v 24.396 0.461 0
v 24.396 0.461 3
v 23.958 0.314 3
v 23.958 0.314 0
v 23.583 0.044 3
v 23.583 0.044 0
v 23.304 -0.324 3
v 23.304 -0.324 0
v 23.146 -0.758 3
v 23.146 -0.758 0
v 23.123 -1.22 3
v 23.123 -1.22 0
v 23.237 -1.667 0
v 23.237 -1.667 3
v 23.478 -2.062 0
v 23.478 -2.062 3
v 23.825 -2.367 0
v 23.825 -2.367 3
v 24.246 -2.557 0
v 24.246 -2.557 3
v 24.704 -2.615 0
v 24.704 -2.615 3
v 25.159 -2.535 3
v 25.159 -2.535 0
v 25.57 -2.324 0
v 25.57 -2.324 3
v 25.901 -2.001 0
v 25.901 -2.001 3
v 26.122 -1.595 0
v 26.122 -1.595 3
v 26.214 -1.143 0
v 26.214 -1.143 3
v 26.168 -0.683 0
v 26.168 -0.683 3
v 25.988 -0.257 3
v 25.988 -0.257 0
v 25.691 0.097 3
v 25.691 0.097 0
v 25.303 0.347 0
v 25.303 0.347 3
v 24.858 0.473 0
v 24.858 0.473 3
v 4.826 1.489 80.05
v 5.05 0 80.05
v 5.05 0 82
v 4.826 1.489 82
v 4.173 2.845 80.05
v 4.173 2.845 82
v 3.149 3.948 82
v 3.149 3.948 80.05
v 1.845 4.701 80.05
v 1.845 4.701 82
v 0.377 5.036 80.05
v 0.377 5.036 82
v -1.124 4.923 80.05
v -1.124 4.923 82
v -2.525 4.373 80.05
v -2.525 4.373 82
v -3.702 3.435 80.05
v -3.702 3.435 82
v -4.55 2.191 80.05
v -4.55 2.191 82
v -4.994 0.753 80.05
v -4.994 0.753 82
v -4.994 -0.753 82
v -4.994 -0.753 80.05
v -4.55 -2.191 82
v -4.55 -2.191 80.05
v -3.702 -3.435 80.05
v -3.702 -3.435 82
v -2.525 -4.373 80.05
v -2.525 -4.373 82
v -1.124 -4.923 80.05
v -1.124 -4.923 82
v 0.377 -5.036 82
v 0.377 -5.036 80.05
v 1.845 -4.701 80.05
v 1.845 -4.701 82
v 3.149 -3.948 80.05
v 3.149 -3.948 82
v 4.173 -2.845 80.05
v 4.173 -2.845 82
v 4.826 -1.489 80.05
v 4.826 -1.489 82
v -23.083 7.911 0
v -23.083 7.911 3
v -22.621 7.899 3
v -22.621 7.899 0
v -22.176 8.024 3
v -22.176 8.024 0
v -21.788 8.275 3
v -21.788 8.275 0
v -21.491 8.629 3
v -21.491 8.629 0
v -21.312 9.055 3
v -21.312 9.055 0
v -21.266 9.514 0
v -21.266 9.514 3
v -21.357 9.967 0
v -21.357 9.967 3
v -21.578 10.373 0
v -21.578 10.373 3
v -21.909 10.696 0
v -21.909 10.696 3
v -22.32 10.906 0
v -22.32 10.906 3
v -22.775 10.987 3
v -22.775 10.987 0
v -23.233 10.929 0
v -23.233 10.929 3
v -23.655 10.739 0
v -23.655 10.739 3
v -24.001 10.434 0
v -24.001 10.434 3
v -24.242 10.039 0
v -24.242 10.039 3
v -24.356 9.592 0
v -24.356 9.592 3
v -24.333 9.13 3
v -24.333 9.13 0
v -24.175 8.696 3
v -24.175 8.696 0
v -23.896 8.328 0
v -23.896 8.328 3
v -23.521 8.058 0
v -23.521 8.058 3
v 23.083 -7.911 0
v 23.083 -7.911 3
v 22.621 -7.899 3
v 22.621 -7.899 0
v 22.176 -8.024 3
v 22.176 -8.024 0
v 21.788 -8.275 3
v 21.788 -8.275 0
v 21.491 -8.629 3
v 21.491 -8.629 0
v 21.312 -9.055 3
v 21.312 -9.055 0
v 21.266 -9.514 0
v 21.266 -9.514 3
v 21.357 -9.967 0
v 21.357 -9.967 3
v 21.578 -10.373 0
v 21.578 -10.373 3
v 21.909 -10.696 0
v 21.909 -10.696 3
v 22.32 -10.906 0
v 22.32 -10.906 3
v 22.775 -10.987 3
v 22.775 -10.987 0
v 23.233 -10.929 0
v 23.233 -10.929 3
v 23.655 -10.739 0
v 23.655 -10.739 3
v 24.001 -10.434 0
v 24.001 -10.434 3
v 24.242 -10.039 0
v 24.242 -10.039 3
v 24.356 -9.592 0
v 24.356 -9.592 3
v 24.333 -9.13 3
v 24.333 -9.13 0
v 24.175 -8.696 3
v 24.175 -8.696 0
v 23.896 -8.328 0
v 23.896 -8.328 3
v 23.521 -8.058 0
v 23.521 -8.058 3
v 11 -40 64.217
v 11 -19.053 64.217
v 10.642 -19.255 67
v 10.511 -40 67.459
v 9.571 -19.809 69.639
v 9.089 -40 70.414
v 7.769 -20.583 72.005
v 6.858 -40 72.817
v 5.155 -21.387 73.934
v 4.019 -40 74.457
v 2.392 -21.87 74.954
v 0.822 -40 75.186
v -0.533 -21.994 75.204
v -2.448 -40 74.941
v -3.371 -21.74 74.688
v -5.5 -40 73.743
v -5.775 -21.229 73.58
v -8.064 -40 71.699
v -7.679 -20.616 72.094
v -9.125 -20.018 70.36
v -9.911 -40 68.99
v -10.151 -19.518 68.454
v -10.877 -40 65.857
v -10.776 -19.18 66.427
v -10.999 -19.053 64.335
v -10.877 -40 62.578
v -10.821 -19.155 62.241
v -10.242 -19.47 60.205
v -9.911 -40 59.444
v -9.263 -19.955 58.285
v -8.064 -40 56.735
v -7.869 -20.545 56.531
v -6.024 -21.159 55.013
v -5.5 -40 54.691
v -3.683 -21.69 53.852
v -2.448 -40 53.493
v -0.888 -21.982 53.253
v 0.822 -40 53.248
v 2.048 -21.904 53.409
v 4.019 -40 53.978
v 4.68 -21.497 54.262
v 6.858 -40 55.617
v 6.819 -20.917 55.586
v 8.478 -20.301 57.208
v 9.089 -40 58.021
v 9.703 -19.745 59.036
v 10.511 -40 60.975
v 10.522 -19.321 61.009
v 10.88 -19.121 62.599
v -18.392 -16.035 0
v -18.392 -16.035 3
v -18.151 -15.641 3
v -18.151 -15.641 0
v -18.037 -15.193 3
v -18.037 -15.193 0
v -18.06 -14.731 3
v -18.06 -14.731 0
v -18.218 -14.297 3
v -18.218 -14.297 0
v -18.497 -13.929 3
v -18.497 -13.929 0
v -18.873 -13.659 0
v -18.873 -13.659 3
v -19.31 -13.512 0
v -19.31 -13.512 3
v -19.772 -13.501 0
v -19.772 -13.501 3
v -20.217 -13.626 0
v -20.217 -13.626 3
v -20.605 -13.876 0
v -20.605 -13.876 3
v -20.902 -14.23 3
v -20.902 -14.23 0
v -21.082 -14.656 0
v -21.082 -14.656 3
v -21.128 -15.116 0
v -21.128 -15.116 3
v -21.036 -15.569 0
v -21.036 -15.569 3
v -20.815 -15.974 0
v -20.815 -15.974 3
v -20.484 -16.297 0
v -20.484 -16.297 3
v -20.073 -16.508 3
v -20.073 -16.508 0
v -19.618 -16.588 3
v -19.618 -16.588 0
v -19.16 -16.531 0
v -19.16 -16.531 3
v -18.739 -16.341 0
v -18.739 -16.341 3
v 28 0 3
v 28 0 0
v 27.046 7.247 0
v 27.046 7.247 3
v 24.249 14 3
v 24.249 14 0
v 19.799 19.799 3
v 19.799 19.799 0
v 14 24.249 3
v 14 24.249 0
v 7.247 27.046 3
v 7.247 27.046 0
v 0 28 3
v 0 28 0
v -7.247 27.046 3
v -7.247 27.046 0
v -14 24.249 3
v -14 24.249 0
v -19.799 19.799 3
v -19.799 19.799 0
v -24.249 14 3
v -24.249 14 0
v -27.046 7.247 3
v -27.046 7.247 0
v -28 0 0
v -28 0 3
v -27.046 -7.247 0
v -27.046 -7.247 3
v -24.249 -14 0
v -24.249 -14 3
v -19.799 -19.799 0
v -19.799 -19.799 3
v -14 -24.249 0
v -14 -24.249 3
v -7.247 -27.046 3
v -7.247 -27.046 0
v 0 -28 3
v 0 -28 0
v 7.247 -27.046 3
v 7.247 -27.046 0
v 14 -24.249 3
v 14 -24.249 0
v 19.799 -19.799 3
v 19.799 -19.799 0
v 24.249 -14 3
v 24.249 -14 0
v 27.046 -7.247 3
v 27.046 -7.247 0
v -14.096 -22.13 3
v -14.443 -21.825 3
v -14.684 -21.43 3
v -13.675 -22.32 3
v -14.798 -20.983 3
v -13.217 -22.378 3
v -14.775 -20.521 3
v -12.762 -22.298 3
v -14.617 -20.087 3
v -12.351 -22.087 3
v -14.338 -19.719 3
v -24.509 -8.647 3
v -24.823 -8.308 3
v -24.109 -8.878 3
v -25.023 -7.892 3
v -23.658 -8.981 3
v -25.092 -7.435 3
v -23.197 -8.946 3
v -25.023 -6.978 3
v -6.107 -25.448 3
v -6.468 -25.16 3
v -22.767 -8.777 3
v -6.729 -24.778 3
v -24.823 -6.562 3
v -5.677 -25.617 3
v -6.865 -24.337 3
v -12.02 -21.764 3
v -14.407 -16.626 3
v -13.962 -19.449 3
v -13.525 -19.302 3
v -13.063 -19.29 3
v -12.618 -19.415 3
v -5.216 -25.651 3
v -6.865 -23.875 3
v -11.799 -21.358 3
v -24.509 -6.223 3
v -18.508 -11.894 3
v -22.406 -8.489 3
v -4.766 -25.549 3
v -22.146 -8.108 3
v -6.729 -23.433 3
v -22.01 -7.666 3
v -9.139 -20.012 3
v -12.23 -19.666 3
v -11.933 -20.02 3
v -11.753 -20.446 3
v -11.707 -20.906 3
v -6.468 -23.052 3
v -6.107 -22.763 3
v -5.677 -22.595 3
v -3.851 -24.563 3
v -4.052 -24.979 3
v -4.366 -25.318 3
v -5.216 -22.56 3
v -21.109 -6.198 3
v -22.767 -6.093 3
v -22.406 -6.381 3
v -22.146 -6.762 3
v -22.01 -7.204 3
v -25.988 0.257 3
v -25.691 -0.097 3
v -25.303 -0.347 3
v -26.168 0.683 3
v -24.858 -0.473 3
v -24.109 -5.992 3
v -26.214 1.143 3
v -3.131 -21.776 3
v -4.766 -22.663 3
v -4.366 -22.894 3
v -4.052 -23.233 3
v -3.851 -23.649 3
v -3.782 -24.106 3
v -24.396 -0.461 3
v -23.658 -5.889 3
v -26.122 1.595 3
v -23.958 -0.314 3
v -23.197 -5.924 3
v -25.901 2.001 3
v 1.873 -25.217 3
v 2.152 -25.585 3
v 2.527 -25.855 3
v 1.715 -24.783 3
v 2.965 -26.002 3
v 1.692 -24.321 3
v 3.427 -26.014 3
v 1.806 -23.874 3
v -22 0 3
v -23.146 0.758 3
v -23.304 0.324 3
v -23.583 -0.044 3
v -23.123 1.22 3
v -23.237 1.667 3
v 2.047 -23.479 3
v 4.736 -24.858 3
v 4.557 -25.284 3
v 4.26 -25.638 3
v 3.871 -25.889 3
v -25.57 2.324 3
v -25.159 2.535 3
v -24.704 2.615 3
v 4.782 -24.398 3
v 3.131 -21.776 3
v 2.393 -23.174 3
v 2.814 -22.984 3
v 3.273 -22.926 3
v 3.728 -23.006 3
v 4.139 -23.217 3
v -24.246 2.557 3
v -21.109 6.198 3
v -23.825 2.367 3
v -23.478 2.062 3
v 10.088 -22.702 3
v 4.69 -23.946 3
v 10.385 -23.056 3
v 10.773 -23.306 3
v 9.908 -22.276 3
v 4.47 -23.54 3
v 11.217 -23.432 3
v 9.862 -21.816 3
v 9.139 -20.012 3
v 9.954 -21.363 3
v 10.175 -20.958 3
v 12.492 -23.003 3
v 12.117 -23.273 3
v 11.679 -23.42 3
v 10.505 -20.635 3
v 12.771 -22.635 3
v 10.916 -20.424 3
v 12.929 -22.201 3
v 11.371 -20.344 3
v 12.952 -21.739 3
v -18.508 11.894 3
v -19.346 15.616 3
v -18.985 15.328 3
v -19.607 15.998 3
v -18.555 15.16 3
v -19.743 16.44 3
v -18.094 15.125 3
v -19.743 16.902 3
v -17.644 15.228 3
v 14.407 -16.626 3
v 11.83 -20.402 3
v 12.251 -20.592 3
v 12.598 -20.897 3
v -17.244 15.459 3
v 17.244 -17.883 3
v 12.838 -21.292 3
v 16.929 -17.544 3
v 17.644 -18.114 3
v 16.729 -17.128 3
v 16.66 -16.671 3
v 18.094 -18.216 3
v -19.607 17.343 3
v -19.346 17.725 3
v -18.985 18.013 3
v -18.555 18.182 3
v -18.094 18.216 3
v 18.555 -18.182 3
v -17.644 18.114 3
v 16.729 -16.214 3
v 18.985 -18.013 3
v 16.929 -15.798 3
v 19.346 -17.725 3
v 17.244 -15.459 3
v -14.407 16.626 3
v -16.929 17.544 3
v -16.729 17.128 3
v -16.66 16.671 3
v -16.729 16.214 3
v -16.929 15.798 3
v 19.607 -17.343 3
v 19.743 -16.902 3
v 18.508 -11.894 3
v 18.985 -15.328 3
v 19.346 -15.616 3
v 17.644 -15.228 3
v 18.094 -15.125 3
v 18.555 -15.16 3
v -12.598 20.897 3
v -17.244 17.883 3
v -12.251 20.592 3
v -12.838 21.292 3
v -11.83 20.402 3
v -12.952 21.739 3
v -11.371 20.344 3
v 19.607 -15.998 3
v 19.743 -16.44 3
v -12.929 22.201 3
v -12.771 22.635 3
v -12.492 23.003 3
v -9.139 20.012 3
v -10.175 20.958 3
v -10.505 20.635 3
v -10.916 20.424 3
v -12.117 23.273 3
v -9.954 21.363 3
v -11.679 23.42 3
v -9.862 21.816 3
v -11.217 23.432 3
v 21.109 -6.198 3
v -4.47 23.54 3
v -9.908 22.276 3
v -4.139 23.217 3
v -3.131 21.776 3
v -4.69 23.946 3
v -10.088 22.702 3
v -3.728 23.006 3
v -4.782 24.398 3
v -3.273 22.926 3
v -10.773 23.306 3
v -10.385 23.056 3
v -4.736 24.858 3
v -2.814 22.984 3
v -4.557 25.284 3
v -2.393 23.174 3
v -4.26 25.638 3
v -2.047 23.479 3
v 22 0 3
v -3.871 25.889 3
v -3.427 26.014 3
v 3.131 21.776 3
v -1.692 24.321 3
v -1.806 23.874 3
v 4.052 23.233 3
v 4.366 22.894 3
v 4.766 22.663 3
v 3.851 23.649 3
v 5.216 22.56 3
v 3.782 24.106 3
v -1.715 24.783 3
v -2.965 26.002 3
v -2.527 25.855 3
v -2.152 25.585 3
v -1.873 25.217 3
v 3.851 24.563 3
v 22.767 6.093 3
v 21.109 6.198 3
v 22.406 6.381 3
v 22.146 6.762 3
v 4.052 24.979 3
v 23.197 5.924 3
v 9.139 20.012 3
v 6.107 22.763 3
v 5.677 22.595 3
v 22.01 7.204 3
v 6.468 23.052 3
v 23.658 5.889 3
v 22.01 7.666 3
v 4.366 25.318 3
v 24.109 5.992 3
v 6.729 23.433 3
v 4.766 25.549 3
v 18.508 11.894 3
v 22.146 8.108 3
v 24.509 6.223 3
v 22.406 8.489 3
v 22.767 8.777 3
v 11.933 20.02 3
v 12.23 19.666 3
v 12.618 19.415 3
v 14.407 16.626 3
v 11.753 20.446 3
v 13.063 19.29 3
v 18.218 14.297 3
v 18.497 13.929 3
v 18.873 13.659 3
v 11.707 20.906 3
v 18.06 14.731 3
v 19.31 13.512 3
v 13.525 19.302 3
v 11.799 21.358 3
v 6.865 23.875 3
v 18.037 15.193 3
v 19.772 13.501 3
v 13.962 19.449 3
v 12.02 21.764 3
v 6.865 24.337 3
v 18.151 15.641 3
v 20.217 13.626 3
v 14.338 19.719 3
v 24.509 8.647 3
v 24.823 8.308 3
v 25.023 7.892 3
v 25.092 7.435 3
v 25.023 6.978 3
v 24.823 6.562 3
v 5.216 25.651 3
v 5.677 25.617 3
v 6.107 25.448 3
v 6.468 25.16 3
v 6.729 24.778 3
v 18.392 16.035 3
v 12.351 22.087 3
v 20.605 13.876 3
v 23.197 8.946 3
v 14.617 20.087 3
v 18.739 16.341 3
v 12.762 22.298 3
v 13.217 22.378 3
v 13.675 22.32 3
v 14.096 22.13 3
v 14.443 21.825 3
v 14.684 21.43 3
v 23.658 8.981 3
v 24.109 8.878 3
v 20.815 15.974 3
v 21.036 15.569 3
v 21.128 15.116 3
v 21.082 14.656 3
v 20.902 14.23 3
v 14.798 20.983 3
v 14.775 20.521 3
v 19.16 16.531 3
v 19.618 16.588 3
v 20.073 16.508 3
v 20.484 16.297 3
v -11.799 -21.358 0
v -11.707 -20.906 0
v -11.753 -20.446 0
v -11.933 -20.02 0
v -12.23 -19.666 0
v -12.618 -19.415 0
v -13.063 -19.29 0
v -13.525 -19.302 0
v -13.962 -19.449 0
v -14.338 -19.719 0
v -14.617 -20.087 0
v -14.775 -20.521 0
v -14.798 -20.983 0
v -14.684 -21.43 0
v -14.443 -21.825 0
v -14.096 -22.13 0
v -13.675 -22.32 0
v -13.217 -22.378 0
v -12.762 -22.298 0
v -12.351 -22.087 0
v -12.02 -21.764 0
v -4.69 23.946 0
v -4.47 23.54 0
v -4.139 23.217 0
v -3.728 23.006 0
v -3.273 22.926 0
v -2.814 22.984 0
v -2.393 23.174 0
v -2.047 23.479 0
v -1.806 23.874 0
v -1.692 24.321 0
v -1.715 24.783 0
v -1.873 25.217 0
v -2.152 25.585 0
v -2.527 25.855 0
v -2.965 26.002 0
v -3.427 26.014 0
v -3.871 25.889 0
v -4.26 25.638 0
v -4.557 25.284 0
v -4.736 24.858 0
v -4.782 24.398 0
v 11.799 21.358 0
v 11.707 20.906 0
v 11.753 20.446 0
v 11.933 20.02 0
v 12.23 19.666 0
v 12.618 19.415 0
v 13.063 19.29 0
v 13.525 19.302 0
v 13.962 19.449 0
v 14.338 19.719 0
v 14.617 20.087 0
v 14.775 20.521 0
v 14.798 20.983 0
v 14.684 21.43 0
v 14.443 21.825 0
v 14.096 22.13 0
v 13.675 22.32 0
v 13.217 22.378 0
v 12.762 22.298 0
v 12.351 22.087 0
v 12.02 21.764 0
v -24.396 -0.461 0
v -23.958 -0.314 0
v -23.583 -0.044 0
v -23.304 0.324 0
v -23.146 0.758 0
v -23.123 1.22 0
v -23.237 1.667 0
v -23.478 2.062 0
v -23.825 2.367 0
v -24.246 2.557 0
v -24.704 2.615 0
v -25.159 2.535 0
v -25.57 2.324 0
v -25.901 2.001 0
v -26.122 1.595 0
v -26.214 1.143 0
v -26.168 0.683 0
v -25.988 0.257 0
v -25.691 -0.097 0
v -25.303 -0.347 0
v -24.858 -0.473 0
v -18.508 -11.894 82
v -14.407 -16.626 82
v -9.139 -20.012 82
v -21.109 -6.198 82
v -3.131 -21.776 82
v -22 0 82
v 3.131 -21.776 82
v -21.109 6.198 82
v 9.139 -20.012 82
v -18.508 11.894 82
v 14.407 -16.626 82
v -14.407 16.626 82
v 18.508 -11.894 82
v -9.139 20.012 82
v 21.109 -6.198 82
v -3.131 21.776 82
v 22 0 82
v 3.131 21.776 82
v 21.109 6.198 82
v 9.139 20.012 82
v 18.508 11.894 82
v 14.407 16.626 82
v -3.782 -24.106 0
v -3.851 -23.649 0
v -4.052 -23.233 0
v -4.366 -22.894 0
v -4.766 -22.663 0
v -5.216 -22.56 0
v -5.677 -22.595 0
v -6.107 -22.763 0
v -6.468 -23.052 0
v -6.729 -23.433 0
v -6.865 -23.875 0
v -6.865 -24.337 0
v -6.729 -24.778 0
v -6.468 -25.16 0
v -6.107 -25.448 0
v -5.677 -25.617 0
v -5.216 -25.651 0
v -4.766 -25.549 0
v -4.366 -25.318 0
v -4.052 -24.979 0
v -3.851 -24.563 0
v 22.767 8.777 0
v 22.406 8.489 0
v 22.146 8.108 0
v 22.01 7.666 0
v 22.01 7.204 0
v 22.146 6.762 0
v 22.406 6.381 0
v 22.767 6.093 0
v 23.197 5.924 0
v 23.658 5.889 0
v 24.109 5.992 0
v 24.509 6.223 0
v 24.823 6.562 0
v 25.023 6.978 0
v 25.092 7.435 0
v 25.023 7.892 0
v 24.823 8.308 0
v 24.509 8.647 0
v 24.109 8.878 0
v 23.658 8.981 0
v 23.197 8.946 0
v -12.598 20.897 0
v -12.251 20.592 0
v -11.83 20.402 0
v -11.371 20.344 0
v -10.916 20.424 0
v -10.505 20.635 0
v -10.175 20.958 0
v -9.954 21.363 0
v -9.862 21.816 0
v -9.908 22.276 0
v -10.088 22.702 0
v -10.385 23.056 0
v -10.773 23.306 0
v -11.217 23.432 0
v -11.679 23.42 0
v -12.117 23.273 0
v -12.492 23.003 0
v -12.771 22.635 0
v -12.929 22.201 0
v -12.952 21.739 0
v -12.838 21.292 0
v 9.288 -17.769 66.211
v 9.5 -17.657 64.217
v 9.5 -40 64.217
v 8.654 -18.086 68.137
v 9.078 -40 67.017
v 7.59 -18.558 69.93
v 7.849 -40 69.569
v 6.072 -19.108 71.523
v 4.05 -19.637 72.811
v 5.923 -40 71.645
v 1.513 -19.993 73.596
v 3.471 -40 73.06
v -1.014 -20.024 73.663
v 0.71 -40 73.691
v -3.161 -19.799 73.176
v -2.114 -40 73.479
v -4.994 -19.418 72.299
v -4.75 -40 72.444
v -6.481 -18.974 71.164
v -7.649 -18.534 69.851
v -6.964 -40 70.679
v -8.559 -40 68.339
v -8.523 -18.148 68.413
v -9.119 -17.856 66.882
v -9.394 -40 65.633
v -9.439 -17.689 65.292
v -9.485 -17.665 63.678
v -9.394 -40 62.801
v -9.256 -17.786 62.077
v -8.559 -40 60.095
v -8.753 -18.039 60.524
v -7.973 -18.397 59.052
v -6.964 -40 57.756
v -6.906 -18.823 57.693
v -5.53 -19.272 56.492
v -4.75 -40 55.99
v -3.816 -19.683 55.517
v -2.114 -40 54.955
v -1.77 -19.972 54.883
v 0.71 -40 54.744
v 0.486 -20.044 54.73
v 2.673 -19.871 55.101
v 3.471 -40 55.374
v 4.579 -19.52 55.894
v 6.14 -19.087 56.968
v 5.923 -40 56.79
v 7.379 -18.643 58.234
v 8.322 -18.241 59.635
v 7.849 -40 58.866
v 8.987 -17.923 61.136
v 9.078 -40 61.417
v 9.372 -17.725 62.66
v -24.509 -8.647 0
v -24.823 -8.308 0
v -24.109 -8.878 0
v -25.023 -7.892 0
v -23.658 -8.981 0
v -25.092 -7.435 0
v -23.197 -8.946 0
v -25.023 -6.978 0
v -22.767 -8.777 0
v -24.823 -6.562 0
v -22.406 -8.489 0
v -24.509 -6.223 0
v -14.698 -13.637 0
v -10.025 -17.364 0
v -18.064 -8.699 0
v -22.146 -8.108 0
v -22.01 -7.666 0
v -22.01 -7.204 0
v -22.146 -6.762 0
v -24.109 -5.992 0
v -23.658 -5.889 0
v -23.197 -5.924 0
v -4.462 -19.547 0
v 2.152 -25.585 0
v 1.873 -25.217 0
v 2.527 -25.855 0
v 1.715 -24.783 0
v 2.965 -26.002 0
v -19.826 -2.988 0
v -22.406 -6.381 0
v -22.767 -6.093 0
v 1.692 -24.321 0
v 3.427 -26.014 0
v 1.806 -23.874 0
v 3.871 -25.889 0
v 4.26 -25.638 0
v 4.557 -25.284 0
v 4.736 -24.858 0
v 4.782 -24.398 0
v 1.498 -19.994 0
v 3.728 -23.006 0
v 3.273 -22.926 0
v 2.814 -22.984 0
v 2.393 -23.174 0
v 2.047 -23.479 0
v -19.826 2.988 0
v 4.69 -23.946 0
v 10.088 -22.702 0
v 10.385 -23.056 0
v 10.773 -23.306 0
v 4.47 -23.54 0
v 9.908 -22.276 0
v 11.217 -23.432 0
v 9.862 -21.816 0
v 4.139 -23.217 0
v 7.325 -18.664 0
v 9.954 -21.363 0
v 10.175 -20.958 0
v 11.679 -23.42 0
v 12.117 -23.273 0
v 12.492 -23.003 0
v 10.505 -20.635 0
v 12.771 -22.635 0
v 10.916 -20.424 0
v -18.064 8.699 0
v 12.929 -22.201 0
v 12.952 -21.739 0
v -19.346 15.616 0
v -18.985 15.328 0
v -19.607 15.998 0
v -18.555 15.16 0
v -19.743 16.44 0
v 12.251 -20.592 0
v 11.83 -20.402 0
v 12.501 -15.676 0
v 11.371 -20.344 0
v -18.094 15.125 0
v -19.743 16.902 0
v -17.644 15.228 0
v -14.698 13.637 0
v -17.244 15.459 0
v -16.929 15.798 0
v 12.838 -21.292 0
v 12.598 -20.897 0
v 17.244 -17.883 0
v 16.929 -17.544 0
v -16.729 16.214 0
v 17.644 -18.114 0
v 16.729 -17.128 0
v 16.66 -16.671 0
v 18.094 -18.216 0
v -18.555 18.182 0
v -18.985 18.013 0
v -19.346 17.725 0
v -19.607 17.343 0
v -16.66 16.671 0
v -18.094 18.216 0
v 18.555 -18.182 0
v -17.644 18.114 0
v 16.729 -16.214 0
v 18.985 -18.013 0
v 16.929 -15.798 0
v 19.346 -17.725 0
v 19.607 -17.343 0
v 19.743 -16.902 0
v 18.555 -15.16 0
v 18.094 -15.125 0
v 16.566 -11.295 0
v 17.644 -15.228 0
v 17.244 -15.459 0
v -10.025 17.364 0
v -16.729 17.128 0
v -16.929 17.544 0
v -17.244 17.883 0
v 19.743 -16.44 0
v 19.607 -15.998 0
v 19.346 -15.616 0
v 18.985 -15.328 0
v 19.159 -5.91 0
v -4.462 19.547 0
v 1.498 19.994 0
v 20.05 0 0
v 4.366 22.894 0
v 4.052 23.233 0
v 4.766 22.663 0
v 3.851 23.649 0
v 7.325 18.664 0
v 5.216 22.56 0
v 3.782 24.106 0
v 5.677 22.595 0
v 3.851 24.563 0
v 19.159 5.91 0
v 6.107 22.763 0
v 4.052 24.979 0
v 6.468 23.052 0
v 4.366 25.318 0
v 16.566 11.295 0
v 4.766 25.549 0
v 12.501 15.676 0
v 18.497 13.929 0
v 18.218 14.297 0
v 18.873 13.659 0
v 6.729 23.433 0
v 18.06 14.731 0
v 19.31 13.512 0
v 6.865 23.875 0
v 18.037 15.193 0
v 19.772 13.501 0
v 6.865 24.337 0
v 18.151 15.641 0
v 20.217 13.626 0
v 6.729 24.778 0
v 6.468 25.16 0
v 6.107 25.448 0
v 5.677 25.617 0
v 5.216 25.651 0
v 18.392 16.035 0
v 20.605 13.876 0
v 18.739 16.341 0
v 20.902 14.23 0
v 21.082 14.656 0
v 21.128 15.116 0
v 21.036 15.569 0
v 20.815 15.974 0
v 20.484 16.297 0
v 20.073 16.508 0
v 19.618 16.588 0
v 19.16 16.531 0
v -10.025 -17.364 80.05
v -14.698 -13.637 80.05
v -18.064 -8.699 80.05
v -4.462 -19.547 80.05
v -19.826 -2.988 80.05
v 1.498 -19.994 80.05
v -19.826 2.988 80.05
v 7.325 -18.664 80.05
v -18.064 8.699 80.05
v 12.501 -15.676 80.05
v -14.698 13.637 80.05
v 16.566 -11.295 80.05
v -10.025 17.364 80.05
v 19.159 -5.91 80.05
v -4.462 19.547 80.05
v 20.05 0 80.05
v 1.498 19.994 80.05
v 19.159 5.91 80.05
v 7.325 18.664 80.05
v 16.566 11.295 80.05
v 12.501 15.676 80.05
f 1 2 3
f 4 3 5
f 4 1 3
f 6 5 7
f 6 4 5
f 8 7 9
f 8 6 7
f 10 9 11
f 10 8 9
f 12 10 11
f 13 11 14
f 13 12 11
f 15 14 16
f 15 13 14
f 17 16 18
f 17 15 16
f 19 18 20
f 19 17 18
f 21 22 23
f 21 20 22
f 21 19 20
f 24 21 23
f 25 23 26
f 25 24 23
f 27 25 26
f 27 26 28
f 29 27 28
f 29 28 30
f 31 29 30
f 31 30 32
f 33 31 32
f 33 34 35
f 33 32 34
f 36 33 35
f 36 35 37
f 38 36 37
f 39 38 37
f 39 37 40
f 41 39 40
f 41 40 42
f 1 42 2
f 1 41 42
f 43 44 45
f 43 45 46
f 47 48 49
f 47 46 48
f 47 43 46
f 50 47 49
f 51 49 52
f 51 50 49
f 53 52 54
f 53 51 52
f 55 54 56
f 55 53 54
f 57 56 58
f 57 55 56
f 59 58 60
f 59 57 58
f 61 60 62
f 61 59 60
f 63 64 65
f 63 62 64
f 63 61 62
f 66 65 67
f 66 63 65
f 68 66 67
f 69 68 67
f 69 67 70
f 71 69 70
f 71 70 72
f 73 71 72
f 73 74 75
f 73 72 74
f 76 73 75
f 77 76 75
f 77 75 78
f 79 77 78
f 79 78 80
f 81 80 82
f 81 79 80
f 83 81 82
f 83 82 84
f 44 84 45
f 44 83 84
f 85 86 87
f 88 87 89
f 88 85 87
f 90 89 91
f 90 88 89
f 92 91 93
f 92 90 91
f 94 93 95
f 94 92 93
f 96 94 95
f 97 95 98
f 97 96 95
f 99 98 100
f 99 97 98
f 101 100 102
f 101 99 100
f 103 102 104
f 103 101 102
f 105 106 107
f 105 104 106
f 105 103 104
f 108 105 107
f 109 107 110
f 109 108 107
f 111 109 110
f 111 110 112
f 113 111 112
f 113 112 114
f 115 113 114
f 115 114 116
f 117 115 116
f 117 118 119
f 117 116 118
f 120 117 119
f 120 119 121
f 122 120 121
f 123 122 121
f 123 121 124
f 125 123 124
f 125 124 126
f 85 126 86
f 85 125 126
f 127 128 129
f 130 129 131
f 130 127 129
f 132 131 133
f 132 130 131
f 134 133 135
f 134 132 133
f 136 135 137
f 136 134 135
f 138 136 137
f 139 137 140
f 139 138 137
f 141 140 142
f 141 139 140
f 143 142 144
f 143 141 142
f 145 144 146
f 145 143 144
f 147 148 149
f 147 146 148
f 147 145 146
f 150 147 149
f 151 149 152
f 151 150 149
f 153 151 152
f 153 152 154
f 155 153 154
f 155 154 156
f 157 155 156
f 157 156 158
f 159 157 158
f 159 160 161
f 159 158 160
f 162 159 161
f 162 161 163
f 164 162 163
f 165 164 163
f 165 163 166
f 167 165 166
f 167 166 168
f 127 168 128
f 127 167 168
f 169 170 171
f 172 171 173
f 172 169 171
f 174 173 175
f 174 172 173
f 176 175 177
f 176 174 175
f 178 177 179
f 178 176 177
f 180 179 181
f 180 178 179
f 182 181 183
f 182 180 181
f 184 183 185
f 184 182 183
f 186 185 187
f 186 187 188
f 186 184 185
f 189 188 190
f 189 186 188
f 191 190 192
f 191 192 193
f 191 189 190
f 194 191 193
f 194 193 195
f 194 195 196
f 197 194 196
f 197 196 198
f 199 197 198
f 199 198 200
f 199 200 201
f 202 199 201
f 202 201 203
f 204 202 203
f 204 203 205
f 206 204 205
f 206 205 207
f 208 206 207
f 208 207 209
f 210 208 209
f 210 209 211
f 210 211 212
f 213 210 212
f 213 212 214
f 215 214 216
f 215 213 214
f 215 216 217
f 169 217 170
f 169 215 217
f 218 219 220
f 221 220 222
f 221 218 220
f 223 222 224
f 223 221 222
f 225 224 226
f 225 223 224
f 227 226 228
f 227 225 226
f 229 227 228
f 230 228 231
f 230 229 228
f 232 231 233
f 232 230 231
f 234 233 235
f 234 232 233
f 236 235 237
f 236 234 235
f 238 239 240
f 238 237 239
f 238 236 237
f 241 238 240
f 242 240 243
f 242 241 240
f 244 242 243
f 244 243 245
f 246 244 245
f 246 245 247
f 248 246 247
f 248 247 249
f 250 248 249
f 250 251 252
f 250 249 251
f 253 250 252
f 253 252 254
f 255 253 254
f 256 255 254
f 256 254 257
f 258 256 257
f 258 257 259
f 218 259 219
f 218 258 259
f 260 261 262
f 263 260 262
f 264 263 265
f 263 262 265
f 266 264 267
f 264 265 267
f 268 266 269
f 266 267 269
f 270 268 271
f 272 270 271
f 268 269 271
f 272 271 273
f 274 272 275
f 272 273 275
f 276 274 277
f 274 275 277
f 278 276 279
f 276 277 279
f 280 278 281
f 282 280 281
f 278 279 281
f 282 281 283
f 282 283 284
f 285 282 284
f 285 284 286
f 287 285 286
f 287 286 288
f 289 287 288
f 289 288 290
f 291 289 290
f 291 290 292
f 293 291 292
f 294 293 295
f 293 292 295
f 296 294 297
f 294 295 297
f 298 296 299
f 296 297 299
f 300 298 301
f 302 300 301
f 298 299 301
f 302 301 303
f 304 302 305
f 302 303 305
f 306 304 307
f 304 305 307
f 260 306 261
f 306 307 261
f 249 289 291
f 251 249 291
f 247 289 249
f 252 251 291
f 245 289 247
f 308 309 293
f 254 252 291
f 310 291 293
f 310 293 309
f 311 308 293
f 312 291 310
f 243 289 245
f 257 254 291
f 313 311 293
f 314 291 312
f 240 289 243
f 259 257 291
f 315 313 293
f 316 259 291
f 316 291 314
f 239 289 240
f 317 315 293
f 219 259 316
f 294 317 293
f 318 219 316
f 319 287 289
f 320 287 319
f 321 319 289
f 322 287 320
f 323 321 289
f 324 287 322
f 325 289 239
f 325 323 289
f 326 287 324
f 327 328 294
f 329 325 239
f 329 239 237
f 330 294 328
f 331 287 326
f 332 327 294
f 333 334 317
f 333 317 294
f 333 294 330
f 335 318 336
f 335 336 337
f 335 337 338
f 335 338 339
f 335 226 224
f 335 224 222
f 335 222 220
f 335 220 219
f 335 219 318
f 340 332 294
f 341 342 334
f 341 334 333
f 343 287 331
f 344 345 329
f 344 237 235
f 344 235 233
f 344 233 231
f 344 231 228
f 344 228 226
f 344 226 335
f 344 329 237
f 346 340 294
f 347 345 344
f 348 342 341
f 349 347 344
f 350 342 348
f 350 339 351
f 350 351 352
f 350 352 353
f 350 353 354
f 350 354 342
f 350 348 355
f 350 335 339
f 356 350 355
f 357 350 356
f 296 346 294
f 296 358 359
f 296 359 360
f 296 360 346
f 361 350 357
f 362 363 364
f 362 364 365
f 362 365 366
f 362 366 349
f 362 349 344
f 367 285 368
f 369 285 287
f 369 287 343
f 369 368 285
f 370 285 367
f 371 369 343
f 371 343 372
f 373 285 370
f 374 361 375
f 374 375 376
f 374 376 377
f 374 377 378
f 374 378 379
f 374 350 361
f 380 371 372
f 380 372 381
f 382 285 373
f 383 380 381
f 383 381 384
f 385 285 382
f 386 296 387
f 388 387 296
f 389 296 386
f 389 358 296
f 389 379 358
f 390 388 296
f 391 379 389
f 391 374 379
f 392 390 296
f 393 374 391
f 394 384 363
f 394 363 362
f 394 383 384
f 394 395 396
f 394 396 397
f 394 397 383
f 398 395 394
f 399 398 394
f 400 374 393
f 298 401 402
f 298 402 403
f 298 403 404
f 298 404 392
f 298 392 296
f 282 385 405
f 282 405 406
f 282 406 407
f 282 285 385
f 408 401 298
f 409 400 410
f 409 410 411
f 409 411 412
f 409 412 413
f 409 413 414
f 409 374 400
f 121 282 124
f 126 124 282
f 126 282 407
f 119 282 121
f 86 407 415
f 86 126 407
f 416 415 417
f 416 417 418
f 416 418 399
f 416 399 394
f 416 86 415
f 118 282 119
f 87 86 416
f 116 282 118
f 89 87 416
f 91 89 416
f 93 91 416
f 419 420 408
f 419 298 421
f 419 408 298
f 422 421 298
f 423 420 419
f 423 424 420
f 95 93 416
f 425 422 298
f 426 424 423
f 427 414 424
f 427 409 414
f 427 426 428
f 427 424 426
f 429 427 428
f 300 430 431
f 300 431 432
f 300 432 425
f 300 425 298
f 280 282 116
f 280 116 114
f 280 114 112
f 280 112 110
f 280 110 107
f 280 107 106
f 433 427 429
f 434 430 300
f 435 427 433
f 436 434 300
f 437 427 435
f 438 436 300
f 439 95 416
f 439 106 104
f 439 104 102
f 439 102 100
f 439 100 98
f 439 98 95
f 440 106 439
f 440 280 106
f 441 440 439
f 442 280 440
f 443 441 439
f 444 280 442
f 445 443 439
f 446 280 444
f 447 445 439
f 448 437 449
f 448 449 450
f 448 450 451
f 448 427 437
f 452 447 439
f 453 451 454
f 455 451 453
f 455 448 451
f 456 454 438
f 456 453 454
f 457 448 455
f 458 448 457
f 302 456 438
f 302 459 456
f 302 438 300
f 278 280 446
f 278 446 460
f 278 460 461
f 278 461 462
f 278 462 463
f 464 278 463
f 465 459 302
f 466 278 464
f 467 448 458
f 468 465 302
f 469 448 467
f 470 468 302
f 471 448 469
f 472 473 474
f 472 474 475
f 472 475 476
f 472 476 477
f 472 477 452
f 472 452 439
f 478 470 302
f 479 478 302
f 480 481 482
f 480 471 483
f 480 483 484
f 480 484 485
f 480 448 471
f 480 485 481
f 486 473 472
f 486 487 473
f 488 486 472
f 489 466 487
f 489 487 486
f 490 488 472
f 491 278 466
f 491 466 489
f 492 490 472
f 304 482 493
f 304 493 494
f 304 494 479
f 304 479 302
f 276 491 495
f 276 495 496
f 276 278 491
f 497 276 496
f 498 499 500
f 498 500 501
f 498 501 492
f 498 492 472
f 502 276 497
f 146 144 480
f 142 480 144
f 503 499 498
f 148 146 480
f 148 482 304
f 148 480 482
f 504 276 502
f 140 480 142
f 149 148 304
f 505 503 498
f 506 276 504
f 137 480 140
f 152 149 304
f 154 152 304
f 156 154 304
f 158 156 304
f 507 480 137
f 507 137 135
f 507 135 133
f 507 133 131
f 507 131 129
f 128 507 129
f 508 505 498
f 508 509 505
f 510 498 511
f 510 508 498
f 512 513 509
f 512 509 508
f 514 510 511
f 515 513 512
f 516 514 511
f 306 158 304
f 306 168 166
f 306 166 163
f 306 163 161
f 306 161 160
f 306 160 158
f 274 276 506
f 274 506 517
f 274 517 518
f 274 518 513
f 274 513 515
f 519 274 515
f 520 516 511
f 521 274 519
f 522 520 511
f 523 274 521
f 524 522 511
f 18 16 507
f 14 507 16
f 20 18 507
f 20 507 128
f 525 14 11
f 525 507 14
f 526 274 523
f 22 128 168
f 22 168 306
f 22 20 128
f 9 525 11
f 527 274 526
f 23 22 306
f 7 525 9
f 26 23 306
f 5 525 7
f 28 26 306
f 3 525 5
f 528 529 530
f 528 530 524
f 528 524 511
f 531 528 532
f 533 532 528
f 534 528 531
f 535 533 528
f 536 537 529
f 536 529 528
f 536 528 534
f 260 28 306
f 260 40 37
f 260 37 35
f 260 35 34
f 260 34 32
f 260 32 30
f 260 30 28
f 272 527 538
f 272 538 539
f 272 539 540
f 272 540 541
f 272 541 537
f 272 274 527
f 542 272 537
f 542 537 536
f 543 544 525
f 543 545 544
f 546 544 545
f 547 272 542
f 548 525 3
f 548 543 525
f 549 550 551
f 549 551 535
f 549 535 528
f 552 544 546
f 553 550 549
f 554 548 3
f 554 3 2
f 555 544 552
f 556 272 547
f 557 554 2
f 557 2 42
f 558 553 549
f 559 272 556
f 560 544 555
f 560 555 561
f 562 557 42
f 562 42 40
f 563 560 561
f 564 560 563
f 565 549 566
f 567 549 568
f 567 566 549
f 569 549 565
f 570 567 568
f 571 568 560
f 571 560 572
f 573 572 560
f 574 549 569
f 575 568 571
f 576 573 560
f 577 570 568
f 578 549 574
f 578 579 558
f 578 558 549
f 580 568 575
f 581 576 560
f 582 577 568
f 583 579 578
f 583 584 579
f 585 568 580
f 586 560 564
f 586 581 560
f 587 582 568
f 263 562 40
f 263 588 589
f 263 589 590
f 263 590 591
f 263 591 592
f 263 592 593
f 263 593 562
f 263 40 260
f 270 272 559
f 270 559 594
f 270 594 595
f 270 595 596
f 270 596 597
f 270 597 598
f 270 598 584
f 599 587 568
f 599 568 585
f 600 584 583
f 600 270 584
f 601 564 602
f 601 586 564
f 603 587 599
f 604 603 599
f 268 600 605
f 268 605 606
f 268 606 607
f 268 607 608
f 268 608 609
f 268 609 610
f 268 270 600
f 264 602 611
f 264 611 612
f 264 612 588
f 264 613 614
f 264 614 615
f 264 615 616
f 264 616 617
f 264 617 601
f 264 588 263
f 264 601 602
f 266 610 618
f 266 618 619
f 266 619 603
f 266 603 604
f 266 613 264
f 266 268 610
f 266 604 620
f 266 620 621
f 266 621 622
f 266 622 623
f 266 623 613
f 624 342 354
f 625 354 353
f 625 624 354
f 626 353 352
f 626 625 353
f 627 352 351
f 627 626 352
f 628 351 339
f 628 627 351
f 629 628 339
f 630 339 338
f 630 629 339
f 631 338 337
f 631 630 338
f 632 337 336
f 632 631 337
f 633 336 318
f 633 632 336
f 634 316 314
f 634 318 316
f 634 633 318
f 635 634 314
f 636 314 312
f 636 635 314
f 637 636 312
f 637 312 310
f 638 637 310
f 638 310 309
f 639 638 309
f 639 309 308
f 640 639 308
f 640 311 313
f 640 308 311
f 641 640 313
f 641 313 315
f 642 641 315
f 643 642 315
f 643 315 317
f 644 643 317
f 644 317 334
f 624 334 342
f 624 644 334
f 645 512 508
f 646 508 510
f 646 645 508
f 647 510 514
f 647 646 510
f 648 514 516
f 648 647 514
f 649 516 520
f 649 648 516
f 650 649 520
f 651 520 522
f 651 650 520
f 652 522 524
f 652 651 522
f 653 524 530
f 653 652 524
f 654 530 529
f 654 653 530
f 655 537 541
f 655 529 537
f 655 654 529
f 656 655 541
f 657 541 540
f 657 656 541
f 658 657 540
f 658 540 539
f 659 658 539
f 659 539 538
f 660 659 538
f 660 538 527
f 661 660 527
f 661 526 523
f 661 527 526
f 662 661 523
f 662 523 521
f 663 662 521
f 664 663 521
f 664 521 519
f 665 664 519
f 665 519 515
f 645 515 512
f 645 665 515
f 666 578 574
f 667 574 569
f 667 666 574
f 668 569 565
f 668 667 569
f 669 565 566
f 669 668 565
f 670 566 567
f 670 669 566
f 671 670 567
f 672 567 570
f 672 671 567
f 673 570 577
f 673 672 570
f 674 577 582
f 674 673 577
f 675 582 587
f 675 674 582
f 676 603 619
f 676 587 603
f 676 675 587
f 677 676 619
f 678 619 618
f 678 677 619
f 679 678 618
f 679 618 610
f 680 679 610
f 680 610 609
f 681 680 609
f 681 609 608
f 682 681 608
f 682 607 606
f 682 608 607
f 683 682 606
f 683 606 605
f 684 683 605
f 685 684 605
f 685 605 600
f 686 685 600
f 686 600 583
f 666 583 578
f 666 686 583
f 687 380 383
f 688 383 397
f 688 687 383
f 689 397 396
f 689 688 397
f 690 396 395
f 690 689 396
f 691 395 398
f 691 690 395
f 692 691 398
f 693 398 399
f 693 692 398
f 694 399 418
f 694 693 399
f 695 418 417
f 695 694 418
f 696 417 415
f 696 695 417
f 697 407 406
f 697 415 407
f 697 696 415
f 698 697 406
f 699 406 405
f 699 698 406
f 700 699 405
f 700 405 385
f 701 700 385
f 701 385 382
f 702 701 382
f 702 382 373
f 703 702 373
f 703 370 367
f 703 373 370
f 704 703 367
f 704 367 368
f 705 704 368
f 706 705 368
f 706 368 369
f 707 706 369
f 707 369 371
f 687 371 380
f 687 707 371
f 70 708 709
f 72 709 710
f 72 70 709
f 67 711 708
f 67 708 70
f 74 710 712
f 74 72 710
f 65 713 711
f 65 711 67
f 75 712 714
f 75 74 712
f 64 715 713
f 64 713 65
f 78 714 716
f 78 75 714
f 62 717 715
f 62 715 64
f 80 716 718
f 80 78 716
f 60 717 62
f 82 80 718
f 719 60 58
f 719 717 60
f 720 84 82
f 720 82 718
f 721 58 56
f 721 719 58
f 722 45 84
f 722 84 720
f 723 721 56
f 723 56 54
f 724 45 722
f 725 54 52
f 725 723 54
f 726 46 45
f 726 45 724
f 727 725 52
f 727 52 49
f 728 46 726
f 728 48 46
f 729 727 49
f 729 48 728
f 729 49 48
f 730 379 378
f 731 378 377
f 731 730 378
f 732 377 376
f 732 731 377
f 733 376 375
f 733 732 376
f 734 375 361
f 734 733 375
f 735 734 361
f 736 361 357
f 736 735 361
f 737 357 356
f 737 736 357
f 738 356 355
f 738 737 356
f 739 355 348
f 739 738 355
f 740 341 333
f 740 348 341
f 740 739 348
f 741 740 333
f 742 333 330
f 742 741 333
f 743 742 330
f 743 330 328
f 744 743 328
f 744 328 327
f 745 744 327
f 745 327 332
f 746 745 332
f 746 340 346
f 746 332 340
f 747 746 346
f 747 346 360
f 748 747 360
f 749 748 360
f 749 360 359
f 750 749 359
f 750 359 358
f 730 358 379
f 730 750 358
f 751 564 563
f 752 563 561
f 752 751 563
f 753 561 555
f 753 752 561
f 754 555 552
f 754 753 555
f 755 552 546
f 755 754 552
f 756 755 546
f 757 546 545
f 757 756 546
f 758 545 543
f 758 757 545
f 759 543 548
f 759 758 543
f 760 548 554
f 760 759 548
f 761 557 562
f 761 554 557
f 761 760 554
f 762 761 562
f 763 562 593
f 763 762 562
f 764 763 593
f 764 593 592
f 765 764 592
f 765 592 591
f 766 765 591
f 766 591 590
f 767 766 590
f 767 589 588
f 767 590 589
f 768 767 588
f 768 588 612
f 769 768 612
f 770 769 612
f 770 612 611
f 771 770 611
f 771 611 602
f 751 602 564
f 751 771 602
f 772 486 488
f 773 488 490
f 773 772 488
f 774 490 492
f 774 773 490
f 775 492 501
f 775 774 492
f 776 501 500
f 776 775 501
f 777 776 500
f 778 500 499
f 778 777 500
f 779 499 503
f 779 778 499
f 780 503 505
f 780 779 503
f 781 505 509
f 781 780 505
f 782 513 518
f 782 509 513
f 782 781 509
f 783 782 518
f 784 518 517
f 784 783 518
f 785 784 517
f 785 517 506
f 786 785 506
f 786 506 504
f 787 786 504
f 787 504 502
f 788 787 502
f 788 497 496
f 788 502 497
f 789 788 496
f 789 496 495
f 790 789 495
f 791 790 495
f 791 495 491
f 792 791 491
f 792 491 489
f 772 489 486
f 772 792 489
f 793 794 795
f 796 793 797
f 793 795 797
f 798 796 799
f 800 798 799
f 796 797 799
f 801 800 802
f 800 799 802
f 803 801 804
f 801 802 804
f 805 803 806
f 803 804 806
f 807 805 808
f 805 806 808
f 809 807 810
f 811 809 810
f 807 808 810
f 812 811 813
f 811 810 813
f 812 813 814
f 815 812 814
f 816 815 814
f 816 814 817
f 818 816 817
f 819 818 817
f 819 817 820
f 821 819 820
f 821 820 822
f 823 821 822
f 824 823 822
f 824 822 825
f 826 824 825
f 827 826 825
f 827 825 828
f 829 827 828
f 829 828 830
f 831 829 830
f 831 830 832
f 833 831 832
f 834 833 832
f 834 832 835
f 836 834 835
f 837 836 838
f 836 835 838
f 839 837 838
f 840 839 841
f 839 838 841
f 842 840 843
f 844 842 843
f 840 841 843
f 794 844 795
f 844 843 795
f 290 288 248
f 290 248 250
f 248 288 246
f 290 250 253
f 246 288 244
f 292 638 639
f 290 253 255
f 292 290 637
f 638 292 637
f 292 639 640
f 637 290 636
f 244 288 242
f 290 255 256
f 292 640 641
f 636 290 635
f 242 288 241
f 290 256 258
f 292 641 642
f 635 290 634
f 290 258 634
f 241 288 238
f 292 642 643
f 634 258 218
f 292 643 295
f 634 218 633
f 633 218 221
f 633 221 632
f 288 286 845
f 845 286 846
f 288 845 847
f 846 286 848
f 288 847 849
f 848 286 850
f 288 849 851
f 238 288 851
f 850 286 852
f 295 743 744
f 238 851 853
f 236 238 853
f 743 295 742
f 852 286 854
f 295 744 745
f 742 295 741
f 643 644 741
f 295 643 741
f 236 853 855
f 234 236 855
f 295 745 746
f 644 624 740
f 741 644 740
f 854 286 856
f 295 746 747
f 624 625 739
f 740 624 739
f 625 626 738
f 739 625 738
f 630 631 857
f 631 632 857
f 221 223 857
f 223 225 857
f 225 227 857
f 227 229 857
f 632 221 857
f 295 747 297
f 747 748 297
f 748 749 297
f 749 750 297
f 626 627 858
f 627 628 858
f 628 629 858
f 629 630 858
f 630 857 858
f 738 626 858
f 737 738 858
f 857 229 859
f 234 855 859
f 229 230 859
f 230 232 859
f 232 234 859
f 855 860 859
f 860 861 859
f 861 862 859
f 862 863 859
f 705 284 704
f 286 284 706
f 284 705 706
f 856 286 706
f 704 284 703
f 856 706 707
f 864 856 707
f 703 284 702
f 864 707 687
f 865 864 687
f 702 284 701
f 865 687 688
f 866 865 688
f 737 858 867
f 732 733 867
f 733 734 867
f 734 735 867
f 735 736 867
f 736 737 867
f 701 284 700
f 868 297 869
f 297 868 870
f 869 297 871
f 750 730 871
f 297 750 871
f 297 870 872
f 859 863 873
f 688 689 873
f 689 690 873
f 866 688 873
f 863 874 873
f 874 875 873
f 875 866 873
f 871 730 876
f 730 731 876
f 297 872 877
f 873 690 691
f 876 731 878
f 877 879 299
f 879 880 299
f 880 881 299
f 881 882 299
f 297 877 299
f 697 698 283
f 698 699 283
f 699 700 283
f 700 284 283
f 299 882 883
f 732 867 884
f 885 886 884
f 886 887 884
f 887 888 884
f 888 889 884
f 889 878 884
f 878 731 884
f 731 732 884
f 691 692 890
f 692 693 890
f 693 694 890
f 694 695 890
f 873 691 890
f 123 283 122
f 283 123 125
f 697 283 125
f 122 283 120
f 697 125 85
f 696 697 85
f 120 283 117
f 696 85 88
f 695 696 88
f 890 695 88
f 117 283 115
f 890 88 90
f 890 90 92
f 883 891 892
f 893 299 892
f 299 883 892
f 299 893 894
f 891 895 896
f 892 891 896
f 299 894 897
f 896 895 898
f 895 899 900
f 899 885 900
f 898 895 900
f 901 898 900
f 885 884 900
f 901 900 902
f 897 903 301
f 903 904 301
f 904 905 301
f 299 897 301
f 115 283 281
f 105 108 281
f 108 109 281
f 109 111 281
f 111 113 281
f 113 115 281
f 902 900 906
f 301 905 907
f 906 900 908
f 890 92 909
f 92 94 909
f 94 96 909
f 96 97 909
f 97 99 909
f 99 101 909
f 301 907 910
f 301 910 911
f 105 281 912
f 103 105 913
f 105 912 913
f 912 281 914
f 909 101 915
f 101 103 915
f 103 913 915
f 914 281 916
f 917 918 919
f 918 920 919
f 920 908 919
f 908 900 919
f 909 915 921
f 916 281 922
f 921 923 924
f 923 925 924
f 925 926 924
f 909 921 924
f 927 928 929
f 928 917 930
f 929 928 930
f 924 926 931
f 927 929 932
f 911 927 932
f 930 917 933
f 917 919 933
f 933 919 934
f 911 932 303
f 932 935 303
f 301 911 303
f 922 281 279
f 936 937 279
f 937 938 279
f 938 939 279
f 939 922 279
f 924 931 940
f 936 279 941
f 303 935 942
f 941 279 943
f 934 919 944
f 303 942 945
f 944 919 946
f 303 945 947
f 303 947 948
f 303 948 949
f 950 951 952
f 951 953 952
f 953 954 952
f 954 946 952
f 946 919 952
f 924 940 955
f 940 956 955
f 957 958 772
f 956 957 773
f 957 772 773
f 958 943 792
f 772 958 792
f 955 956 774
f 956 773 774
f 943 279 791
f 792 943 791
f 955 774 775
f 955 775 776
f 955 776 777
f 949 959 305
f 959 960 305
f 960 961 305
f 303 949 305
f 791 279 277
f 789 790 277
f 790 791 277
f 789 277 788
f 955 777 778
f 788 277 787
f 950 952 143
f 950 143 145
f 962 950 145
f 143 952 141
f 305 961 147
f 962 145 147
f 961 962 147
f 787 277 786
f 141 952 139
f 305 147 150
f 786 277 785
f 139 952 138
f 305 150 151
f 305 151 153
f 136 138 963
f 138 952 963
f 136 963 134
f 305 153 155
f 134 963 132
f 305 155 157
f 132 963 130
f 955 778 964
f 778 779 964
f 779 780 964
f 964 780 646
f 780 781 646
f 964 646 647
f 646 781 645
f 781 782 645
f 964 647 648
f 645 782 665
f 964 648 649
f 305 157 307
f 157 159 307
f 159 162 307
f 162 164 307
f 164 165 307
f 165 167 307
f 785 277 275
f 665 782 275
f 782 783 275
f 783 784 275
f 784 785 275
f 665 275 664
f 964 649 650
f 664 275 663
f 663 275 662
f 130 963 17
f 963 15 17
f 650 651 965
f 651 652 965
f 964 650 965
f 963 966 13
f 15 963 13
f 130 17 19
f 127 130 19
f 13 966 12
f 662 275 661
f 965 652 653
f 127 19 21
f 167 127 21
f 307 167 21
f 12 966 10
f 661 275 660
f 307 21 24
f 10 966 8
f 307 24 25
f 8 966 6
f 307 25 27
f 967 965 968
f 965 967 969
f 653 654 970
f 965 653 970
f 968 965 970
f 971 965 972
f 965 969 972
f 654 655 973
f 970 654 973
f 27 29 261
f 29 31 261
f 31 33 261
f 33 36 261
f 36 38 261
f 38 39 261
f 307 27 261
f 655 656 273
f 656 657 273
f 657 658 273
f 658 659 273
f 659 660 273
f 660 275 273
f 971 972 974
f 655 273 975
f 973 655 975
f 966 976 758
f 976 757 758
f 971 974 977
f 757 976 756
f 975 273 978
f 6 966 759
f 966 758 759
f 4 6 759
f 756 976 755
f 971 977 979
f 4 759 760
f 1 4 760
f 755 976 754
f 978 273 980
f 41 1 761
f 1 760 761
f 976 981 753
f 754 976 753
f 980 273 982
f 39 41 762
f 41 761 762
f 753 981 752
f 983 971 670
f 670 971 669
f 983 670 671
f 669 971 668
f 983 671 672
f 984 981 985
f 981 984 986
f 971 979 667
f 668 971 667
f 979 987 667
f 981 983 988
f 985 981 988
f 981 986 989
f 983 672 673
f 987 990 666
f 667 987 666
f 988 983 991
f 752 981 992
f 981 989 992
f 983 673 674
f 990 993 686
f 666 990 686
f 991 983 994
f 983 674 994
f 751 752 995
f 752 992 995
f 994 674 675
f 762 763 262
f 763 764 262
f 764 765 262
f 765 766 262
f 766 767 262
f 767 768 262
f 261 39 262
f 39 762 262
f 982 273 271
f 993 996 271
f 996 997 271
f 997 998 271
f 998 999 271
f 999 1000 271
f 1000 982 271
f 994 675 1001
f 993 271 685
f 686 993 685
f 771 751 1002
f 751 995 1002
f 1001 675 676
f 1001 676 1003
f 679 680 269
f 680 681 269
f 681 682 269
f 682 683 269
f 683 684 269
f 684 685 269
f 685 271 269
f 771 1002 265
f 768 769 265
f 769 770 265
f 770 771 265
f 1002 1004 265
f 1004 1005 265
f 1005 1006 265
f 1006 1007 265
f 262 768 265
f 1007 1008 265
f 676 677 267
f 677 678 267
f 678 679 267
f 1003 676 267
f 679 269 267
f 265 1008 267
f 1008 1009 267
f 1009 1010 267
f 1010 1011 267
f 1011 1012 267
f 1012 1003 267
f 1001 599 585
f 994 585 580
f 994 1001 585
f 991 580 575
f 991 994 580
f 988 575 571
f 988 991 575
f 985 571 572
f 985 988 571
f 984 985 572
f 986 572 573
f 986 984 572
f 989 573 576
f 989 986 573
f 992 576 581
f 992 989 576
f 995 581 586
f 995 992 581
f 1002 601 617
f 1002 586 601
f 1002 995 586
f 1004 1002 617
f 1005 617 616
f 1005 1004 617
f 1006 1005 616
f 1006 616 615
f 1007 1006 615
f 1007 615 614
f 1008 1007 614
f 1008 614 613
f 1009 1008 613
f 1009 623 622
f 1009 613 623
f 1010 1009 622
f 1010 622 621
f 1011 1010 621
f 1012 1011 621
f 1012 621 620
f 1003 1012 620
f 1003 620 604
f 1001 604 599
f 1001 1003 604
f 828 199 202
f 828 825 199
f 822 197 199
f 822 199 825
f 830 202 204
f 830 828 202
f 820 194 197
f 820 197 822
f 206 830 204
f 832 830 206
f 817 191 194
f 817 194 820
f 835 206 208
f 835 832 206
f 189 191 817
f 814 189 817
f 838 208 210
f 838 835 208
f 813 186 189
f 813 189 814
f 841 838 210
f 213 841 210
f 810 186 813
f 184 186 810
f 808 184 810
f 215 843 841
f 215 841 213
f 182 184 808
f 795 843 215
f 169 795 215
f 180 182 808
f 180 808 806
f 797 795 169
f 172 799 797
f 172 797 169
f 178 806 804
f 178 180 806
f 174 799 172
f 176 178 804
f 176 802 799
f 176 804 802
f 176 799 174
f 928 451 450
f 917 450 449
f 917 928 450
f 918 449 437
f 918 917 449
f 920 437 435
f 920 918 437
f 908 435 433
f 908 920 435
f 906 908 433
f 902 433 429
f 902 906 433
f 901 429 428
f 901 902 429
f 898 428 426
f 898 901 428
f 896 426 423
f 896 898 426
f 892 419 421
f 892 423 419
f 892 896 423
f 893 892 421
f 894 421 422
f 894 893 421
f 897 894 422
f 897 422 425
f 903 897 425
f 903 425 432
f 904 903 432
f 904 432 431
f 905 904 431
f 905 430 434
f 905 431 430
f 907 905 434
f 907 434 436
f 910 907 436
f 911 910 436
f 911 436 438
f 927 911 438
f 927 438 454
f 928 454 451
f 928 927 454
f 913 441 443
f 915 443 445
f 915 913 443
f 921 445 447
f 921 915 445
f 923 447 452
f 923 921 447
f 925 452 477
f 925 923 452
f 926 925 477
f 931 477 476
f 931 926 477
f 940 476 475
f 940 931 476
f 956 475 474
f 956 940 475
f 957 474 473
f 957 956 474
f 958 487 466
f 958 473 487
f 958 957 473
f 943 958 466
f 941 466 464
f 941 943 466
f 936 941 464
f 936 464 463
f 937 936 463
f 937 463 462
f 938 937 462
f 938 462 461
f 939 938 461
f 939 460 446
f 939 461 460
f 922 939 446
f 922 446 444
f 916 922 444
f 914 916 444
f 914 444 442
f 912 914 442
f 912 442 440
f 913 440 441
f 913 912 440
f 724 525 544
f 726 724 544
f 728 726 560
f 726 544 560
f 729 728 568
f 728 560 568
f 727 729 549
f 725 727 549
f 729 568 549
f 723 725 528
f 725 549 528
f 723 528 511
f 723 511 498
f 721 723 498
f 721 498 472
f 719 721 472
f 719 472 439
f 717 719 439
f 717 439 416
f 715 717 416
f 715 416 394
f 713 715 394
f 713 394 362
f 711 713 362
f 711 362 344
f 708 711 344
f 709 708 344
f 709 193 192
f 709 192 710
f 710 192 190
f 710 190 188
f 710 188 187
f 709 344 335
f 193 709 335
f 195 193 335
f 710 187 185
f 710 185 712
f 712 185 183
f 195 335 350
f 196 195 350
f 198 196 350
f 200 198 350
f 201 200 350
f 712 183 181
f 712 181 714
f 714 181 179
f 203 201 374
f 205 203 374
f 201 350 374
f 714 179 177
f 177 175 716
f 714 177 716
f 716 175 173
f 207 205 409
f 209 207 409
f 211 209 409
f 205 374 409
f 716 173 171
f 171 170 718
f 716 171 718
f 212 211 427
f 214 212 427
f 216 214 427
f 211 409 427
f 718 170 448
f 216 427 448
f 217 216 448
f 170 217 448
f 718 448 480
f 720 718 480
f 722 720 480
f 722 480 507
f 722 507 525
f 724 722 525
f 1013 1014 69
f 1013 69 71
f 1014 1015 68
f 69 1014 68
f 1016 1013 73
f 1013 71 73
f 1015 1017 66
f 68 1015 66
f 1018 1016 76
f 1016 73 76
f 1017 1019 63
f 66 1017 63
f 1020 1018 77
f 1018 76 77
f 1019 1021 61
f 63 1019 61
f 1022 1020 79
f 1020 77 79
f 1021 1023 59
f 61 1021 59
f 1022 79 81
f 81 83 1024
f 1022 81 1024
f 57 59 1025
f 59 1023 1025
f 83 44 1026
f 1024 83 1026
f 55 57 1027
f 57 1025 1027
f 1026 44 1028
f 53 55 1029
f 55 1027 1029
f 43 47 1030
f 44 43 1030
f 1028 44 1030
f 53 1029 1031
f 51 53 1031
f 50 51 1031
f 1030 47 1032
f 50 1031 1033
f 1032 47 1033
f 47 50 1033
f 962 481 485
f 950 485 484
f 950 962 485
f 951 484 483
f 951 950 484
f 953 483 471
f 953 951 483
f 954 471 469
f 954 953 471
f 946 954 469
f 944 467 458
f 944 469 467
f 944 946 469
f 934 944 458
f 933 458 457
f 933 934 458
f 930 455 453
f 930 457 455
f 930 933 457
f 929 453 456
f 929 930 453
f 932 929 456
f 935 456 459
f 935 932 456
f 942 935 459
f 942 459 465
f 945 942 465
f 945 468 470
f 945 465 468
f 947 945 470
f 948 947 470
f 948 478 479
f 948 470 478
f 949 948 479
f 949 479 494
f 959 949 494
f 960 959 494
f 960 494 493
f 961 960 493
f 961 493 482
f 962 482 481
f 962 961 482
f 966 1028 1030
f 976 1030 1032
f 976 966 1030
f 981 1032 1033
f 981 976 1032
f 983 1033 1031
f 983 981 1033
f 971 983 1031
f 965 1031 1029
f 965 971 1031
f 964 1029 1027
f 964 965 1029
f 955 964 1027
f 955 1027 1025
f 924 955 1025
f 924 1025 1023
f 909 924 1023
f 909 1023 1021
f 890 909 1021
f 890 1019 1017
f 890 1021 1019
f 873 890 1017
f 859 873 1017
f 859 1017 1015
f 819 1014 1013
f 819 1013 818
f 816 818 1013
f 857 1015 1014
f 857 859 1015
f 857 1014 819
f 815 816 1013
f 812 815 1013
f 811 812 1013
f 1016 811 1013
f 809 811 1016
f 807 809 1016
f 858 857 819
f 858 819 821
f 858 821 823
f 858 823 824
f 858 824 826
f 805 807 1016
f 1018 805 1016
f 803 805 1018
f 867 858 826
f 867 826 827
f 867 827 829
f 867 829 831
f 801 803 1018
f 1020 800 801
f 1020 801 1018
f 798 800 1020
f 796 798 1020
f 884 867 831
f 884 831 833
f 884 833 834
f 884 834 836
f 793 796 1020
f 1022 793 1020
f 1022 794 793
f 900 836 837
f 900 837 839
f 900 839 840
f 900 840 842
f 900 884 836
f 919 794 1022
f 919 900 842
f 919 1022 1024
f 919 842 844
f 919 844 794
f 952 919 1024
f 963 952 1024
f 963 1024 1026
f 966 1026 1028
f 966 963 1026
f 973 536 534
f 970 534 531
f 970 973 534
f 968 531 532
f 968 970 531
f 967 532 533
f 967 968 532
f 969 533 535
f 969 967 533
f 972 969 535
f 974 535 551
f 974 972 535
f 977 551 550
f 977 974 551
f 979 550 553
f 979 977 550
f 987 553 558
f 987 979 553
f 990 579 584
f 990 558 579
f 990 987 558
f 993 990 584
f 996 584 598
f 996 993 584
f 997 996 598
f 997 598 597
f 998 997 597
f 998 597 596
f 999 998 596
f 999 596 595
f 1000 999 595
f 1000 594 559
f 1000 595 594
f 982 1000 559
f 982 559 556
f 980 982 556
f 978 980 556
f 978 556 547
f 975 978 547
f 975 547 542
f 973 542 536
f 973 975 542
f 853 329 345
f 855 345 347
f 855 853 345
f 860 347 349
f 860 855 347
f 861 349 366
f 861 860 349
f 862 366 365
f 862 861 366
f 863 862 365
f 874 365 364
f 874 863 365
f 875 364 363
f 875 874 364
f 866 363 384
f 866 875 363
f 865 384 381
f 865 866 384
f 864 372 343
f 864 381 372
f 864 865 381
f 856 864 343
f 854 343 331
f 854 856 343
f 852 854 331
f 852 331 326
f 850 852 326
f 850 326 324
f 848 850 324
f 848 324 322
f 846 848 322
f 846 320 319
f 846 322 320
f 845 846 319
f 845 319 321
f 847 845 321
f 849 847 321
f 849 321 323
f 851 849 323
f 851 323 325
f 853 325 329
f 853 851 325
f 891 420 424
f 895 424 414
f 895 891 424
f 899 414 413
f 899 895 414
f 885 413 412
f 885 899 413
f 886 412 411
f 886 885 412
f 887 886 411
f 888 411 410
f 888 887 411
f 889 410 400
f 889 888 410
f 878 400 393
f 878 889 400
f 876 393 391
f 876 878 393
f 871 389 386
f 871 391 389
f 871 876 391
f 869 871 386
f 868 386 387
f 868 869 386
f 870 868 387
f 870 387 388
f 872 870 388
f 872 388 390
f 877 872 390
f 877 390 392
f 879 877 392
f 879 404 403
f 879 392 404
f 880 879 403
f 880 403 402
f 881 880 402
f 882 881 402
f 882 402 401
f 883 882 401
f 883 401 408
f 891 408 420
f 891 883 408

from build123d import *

# Parameters (mm, degrees)
F0_R            = 22
F1_DEPTH        = 82
F2_T            = -1.95
F0_R_2          = 28
F3_DEPTH        = 3
F5_R            = 5.05
F6_DEPTH        = 90
F7_R            = 1.55
F8_DEPTH        = 5
F8_COPIES_COUNT = 18
F10_R           = 11
F12_R           = 9.5
F13_DEPTH       = 30


# Not quite as in the source:
# - a pattern or mirror of a feature is missing from the dataset's text; its kind, count and spacing are read off the source's solid


with BuildPart() as f1:
    # F0 (on Top) → F1 (new body)
    with BuildSketch(Plane.XY):
        Circle(F0_R)
    extrude(amount=F1_DEPTH)

    # F2
    f2_openings = [f1.faces().sort_by_distance(p)[0] for p in [
        (0, 0, 0),
    ]]
    offset(amount=F2_T, openings=f2_openings)

    # F0 (on Top) → F3 (join)
    with BuildSketch(Plane.XY):
        Circle(F0_R_2)
        Circle(F0_R, mode=Mode.SUBTRACT)
    extrude(amount=F3_DEPTH)

    # F5 (on Top) → F6 (cut)
    with BuildSketch(Plane.XY):
        Circle(F5_R)
    extrude(amount=F6_DEPTH, mode=Mode.SUBTRACT)

    # F7 (on face) → F8 (cut)
    with BuildSketch(Plane.XY):
        with Locations((-5.3322692402, -24.1057705134)):
            Circle(F7_R)
    f8 = extrude(amount=F8_DEPTH, mode=Mode.SUBTRACT)

    # F8_copies: F8 ×18 about axis
    f8_copies_axis = Axis((0, 0, 0), (0, 0, 1))
    for i in range(1, F8_COPIES_COUNT):
        add(f8.rotate(f8_copies_axis, i * 360 / F8_COPIES_COUNT), mode=Mode.SUBTRACT)

    # F10 (on offset) → F11 (join, up to the next surface of F1)
    with BuildSketch(Plane.XZ.offset(40)):
        with Locations((0, 64.2171450533)):
            Circle(F10_R)
    extrude(until=Until.NEXT, dir=(0, 1, 0))

    # F12 (on face) → F13 (cut)
    with BuildSketch(Plane.XZ.offset(40)):
        with Locations((0, 64.2171450533)):
            Circle(F12_R)
    extrude(amount=-F13_DEPTH, mode=Mode.SUBTRACT)


solid = f1.part
